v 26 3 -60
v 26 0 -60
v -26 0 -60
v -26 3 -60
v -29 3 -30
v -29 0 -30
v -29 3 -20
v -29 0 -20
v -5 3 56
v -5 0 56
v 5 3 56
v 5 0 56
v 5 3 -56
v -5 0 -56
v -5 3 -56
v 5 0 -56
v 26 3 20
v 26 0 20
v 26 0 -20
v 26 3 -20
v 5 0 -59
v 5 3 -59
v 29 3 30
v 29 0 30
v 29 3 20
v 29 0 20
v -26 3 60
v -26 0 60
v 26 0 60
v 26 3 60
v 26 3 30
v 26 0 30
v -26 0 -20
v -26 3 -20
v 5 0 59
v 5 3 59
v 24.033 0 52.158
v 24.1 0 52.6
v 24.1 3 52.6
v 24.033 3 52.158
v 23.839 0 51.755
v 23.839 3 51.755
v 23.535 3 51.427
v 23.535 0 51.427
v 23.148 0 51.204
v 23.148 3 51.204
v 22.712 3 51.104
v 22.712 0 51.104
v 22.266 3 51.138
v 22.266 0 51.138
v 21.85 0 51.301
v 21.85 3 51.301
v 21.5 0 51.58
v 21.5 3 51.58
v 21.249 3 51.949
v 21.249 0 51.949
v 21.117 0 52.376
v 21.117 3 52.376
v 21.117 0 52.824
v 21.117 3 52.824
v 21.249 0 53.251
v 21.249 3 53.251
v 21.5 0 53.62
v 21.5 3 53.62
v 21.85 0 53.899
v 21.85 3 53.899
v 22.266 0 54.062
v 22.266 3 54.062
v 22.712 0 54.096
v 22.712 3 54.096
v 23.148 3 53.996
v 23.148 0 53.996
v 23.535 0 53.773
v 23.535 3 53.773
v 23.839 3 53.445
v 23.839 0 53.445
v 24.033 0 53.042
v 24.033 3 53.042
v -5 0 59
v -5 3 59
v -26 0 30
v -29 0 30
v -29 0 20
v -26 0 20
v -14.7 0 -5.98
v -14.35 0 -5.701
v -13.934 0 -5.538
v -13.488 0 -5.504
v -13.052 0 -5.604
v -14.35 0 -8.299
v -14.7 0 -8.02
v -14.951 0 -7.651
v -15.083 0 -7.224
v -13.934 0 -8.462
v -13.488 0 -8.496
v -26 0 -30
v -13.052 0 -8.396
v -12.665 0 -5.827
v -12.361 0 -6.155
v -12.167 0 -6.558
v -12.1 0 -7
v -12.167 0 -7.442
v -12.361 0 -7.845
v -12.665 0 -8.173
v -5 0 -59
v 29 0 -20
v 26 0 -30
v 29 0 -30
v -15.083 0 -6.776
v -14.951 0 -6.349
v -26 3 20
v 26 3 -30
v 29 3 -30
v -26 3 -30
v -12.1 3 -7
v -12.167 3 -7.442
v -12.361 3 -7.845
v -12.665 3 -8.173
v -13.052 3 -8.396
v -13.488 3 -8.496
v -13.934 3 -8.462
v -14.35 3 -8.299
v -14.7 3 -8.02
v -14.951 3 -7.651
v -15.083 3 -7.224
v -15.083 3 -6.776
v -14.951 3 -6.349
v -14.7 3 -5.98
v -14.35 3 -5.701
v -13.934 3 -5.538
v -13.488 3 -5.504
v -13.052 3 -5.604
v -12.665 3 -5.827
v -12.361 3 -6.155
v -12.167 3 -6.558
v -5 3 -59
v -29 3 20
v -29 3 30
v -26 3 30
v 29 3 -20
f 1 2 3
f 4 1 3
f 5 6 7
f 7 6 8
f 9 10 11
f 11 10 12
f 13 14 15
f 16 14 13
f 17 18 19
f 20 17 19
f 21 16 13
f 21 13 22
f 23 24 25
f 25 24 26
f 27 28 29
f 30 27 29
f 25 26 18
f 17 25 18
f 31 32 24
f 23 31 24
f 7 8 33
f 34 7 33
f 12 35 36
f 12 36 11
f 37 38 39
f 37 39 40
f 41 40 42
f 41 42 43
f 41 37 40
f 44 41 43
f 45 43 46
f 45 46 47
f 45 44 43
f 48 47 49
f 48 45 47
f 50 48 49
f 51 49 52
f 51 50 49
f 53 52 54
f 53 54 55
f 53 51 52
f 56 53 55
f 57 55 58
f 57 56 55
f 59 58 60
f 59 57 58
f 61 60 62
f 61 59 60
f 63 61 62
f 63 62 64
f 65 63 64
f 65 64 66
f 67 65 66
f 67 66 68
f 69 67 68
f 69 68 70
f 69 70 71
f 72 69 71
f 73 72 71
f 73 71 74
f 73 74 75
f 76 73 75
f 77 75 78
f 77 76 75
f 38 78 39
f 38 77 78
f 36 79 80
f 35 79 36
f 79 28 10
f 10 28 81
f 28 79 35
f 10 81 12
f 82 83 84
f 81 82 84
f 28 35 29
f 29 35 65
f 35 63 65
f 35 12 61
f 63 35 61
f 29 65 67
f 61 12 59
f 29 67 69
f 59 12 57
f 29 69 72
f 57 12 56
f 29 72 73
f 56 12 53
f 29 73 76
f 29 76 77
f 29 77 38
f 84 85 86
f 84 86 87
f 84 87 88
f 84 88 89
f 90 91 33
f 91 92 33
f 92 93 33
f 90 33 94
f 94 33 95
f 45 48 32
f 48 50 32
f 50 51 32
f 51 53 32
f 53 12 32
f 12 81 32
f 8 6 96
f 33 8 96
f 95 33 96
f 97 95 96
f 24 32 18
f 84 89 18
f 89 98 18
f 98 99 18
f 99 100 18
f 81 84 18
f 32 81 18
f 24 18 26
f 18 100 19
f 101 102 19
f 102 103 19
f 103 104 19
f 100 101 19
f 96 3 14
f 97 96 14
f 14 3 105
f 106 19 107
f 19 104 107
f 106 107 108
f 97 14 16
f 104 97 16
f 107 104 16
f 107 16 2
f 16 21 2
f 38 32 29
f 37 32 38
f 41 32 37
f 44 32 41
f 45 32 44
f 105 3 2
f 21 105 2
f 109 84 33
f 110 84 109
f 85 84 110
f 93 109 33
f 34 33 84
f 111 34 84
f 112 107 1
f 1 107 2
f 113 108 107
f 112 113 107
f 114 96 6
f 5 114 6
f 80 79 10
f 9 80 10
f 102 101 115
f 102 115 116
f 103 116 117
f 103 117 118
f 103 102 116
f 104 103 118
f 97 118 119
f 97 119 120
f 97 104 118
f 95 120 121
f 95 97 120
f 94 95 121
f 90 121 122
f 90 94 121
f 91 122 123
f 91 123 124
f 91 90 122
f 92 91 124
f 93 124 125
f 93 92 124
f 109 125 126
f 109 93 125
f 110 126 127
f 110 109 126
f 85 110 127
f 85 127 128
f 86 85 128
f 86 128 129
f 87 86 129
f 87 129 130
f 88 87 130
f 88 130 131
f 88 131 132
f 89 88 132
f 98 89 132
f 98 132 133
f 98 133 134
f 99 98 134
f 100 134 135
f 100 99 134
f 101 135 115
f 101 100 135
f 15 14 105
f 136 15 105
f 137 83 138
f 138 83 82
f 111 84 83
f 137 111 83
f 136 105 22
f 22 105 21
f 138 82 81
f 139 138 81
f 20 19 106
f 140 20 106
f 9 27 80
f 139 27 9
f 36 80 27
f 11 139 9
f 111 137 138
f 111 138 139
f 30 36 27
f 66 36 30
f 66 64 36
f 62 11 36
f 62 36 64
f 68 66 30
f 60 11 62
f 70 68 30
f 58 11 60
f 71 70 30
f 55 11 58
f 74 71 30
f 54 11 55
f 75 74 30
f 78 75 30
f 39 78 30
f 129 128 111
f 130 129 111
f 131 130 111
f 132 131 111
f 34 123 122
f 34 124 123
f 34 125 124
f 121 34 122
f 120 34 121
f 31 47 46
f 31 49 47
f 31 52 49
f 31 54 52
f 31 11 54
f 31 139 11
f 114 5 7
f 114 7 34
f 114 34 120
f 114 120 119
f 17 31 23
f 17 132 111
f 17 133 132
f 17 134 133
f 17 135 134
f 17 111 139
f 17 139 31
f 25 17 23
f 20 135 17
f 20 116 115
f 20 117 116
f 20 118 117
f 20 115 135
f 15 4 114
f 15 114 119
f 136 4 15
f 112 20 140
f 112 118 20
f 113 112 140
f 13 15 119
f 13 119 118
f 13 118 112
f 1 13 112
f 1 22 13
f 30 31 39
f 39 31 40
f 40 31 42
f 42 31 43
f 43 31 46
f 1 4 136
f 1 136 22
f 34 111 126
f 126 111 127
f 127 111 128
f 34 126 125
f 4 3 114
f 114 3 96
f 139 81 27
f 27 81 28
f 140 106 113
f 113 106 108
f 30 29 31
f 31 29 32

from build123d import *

# Parameters (mm, degrees)
SKETCH1_R           = 1.5
SKETCH1_W           = 10
SKETCH1_H           = 3
BOSS_EXTRUDE1_DEPTH = 3


with BuildPart() as part:
    # Sketch1 → Boss-Extrude1 (new body)
    with BuildSketch(Plane(origin=(0, 0, 0), x_dir=(1, 0, 0), z_dir=(0, 1, 0))):
        Polygon((-26, -30), (-26, -60), (26, -60), (26, -30), (29, -30), (29, -20), (26, -20), (26, 20), (29, 20), (29, 30), (26, 30), (26, 60), (-26, 60), (-26, 30), (-29, 30), (-29, 20), (-26, 20), (-26, -20), (-29, -20), (-29, -30), align=None)
        with Locations((22.6, -52.6)):
            Circle(SKETCH1_R, mode=Mode.SUBTRACT)
        with Locations((-13.6, 7)):
            Circle(SKETCH1_R, mode=Mode.SUBTRACT)
        with Locations((0, -57.5)):
            Rectangle(SKETCH1_W, SKETCH1_H, mode=Mode.SUBTRACT)
        with Locations((0, 57.5)):
            Rectangle(SKETCH1_W, SKETCH1_H, mode=Mode.SUBTRACT)
    extrude(amount=BOSS_EXTRUDE1_DEPTH)


solid = part.part
